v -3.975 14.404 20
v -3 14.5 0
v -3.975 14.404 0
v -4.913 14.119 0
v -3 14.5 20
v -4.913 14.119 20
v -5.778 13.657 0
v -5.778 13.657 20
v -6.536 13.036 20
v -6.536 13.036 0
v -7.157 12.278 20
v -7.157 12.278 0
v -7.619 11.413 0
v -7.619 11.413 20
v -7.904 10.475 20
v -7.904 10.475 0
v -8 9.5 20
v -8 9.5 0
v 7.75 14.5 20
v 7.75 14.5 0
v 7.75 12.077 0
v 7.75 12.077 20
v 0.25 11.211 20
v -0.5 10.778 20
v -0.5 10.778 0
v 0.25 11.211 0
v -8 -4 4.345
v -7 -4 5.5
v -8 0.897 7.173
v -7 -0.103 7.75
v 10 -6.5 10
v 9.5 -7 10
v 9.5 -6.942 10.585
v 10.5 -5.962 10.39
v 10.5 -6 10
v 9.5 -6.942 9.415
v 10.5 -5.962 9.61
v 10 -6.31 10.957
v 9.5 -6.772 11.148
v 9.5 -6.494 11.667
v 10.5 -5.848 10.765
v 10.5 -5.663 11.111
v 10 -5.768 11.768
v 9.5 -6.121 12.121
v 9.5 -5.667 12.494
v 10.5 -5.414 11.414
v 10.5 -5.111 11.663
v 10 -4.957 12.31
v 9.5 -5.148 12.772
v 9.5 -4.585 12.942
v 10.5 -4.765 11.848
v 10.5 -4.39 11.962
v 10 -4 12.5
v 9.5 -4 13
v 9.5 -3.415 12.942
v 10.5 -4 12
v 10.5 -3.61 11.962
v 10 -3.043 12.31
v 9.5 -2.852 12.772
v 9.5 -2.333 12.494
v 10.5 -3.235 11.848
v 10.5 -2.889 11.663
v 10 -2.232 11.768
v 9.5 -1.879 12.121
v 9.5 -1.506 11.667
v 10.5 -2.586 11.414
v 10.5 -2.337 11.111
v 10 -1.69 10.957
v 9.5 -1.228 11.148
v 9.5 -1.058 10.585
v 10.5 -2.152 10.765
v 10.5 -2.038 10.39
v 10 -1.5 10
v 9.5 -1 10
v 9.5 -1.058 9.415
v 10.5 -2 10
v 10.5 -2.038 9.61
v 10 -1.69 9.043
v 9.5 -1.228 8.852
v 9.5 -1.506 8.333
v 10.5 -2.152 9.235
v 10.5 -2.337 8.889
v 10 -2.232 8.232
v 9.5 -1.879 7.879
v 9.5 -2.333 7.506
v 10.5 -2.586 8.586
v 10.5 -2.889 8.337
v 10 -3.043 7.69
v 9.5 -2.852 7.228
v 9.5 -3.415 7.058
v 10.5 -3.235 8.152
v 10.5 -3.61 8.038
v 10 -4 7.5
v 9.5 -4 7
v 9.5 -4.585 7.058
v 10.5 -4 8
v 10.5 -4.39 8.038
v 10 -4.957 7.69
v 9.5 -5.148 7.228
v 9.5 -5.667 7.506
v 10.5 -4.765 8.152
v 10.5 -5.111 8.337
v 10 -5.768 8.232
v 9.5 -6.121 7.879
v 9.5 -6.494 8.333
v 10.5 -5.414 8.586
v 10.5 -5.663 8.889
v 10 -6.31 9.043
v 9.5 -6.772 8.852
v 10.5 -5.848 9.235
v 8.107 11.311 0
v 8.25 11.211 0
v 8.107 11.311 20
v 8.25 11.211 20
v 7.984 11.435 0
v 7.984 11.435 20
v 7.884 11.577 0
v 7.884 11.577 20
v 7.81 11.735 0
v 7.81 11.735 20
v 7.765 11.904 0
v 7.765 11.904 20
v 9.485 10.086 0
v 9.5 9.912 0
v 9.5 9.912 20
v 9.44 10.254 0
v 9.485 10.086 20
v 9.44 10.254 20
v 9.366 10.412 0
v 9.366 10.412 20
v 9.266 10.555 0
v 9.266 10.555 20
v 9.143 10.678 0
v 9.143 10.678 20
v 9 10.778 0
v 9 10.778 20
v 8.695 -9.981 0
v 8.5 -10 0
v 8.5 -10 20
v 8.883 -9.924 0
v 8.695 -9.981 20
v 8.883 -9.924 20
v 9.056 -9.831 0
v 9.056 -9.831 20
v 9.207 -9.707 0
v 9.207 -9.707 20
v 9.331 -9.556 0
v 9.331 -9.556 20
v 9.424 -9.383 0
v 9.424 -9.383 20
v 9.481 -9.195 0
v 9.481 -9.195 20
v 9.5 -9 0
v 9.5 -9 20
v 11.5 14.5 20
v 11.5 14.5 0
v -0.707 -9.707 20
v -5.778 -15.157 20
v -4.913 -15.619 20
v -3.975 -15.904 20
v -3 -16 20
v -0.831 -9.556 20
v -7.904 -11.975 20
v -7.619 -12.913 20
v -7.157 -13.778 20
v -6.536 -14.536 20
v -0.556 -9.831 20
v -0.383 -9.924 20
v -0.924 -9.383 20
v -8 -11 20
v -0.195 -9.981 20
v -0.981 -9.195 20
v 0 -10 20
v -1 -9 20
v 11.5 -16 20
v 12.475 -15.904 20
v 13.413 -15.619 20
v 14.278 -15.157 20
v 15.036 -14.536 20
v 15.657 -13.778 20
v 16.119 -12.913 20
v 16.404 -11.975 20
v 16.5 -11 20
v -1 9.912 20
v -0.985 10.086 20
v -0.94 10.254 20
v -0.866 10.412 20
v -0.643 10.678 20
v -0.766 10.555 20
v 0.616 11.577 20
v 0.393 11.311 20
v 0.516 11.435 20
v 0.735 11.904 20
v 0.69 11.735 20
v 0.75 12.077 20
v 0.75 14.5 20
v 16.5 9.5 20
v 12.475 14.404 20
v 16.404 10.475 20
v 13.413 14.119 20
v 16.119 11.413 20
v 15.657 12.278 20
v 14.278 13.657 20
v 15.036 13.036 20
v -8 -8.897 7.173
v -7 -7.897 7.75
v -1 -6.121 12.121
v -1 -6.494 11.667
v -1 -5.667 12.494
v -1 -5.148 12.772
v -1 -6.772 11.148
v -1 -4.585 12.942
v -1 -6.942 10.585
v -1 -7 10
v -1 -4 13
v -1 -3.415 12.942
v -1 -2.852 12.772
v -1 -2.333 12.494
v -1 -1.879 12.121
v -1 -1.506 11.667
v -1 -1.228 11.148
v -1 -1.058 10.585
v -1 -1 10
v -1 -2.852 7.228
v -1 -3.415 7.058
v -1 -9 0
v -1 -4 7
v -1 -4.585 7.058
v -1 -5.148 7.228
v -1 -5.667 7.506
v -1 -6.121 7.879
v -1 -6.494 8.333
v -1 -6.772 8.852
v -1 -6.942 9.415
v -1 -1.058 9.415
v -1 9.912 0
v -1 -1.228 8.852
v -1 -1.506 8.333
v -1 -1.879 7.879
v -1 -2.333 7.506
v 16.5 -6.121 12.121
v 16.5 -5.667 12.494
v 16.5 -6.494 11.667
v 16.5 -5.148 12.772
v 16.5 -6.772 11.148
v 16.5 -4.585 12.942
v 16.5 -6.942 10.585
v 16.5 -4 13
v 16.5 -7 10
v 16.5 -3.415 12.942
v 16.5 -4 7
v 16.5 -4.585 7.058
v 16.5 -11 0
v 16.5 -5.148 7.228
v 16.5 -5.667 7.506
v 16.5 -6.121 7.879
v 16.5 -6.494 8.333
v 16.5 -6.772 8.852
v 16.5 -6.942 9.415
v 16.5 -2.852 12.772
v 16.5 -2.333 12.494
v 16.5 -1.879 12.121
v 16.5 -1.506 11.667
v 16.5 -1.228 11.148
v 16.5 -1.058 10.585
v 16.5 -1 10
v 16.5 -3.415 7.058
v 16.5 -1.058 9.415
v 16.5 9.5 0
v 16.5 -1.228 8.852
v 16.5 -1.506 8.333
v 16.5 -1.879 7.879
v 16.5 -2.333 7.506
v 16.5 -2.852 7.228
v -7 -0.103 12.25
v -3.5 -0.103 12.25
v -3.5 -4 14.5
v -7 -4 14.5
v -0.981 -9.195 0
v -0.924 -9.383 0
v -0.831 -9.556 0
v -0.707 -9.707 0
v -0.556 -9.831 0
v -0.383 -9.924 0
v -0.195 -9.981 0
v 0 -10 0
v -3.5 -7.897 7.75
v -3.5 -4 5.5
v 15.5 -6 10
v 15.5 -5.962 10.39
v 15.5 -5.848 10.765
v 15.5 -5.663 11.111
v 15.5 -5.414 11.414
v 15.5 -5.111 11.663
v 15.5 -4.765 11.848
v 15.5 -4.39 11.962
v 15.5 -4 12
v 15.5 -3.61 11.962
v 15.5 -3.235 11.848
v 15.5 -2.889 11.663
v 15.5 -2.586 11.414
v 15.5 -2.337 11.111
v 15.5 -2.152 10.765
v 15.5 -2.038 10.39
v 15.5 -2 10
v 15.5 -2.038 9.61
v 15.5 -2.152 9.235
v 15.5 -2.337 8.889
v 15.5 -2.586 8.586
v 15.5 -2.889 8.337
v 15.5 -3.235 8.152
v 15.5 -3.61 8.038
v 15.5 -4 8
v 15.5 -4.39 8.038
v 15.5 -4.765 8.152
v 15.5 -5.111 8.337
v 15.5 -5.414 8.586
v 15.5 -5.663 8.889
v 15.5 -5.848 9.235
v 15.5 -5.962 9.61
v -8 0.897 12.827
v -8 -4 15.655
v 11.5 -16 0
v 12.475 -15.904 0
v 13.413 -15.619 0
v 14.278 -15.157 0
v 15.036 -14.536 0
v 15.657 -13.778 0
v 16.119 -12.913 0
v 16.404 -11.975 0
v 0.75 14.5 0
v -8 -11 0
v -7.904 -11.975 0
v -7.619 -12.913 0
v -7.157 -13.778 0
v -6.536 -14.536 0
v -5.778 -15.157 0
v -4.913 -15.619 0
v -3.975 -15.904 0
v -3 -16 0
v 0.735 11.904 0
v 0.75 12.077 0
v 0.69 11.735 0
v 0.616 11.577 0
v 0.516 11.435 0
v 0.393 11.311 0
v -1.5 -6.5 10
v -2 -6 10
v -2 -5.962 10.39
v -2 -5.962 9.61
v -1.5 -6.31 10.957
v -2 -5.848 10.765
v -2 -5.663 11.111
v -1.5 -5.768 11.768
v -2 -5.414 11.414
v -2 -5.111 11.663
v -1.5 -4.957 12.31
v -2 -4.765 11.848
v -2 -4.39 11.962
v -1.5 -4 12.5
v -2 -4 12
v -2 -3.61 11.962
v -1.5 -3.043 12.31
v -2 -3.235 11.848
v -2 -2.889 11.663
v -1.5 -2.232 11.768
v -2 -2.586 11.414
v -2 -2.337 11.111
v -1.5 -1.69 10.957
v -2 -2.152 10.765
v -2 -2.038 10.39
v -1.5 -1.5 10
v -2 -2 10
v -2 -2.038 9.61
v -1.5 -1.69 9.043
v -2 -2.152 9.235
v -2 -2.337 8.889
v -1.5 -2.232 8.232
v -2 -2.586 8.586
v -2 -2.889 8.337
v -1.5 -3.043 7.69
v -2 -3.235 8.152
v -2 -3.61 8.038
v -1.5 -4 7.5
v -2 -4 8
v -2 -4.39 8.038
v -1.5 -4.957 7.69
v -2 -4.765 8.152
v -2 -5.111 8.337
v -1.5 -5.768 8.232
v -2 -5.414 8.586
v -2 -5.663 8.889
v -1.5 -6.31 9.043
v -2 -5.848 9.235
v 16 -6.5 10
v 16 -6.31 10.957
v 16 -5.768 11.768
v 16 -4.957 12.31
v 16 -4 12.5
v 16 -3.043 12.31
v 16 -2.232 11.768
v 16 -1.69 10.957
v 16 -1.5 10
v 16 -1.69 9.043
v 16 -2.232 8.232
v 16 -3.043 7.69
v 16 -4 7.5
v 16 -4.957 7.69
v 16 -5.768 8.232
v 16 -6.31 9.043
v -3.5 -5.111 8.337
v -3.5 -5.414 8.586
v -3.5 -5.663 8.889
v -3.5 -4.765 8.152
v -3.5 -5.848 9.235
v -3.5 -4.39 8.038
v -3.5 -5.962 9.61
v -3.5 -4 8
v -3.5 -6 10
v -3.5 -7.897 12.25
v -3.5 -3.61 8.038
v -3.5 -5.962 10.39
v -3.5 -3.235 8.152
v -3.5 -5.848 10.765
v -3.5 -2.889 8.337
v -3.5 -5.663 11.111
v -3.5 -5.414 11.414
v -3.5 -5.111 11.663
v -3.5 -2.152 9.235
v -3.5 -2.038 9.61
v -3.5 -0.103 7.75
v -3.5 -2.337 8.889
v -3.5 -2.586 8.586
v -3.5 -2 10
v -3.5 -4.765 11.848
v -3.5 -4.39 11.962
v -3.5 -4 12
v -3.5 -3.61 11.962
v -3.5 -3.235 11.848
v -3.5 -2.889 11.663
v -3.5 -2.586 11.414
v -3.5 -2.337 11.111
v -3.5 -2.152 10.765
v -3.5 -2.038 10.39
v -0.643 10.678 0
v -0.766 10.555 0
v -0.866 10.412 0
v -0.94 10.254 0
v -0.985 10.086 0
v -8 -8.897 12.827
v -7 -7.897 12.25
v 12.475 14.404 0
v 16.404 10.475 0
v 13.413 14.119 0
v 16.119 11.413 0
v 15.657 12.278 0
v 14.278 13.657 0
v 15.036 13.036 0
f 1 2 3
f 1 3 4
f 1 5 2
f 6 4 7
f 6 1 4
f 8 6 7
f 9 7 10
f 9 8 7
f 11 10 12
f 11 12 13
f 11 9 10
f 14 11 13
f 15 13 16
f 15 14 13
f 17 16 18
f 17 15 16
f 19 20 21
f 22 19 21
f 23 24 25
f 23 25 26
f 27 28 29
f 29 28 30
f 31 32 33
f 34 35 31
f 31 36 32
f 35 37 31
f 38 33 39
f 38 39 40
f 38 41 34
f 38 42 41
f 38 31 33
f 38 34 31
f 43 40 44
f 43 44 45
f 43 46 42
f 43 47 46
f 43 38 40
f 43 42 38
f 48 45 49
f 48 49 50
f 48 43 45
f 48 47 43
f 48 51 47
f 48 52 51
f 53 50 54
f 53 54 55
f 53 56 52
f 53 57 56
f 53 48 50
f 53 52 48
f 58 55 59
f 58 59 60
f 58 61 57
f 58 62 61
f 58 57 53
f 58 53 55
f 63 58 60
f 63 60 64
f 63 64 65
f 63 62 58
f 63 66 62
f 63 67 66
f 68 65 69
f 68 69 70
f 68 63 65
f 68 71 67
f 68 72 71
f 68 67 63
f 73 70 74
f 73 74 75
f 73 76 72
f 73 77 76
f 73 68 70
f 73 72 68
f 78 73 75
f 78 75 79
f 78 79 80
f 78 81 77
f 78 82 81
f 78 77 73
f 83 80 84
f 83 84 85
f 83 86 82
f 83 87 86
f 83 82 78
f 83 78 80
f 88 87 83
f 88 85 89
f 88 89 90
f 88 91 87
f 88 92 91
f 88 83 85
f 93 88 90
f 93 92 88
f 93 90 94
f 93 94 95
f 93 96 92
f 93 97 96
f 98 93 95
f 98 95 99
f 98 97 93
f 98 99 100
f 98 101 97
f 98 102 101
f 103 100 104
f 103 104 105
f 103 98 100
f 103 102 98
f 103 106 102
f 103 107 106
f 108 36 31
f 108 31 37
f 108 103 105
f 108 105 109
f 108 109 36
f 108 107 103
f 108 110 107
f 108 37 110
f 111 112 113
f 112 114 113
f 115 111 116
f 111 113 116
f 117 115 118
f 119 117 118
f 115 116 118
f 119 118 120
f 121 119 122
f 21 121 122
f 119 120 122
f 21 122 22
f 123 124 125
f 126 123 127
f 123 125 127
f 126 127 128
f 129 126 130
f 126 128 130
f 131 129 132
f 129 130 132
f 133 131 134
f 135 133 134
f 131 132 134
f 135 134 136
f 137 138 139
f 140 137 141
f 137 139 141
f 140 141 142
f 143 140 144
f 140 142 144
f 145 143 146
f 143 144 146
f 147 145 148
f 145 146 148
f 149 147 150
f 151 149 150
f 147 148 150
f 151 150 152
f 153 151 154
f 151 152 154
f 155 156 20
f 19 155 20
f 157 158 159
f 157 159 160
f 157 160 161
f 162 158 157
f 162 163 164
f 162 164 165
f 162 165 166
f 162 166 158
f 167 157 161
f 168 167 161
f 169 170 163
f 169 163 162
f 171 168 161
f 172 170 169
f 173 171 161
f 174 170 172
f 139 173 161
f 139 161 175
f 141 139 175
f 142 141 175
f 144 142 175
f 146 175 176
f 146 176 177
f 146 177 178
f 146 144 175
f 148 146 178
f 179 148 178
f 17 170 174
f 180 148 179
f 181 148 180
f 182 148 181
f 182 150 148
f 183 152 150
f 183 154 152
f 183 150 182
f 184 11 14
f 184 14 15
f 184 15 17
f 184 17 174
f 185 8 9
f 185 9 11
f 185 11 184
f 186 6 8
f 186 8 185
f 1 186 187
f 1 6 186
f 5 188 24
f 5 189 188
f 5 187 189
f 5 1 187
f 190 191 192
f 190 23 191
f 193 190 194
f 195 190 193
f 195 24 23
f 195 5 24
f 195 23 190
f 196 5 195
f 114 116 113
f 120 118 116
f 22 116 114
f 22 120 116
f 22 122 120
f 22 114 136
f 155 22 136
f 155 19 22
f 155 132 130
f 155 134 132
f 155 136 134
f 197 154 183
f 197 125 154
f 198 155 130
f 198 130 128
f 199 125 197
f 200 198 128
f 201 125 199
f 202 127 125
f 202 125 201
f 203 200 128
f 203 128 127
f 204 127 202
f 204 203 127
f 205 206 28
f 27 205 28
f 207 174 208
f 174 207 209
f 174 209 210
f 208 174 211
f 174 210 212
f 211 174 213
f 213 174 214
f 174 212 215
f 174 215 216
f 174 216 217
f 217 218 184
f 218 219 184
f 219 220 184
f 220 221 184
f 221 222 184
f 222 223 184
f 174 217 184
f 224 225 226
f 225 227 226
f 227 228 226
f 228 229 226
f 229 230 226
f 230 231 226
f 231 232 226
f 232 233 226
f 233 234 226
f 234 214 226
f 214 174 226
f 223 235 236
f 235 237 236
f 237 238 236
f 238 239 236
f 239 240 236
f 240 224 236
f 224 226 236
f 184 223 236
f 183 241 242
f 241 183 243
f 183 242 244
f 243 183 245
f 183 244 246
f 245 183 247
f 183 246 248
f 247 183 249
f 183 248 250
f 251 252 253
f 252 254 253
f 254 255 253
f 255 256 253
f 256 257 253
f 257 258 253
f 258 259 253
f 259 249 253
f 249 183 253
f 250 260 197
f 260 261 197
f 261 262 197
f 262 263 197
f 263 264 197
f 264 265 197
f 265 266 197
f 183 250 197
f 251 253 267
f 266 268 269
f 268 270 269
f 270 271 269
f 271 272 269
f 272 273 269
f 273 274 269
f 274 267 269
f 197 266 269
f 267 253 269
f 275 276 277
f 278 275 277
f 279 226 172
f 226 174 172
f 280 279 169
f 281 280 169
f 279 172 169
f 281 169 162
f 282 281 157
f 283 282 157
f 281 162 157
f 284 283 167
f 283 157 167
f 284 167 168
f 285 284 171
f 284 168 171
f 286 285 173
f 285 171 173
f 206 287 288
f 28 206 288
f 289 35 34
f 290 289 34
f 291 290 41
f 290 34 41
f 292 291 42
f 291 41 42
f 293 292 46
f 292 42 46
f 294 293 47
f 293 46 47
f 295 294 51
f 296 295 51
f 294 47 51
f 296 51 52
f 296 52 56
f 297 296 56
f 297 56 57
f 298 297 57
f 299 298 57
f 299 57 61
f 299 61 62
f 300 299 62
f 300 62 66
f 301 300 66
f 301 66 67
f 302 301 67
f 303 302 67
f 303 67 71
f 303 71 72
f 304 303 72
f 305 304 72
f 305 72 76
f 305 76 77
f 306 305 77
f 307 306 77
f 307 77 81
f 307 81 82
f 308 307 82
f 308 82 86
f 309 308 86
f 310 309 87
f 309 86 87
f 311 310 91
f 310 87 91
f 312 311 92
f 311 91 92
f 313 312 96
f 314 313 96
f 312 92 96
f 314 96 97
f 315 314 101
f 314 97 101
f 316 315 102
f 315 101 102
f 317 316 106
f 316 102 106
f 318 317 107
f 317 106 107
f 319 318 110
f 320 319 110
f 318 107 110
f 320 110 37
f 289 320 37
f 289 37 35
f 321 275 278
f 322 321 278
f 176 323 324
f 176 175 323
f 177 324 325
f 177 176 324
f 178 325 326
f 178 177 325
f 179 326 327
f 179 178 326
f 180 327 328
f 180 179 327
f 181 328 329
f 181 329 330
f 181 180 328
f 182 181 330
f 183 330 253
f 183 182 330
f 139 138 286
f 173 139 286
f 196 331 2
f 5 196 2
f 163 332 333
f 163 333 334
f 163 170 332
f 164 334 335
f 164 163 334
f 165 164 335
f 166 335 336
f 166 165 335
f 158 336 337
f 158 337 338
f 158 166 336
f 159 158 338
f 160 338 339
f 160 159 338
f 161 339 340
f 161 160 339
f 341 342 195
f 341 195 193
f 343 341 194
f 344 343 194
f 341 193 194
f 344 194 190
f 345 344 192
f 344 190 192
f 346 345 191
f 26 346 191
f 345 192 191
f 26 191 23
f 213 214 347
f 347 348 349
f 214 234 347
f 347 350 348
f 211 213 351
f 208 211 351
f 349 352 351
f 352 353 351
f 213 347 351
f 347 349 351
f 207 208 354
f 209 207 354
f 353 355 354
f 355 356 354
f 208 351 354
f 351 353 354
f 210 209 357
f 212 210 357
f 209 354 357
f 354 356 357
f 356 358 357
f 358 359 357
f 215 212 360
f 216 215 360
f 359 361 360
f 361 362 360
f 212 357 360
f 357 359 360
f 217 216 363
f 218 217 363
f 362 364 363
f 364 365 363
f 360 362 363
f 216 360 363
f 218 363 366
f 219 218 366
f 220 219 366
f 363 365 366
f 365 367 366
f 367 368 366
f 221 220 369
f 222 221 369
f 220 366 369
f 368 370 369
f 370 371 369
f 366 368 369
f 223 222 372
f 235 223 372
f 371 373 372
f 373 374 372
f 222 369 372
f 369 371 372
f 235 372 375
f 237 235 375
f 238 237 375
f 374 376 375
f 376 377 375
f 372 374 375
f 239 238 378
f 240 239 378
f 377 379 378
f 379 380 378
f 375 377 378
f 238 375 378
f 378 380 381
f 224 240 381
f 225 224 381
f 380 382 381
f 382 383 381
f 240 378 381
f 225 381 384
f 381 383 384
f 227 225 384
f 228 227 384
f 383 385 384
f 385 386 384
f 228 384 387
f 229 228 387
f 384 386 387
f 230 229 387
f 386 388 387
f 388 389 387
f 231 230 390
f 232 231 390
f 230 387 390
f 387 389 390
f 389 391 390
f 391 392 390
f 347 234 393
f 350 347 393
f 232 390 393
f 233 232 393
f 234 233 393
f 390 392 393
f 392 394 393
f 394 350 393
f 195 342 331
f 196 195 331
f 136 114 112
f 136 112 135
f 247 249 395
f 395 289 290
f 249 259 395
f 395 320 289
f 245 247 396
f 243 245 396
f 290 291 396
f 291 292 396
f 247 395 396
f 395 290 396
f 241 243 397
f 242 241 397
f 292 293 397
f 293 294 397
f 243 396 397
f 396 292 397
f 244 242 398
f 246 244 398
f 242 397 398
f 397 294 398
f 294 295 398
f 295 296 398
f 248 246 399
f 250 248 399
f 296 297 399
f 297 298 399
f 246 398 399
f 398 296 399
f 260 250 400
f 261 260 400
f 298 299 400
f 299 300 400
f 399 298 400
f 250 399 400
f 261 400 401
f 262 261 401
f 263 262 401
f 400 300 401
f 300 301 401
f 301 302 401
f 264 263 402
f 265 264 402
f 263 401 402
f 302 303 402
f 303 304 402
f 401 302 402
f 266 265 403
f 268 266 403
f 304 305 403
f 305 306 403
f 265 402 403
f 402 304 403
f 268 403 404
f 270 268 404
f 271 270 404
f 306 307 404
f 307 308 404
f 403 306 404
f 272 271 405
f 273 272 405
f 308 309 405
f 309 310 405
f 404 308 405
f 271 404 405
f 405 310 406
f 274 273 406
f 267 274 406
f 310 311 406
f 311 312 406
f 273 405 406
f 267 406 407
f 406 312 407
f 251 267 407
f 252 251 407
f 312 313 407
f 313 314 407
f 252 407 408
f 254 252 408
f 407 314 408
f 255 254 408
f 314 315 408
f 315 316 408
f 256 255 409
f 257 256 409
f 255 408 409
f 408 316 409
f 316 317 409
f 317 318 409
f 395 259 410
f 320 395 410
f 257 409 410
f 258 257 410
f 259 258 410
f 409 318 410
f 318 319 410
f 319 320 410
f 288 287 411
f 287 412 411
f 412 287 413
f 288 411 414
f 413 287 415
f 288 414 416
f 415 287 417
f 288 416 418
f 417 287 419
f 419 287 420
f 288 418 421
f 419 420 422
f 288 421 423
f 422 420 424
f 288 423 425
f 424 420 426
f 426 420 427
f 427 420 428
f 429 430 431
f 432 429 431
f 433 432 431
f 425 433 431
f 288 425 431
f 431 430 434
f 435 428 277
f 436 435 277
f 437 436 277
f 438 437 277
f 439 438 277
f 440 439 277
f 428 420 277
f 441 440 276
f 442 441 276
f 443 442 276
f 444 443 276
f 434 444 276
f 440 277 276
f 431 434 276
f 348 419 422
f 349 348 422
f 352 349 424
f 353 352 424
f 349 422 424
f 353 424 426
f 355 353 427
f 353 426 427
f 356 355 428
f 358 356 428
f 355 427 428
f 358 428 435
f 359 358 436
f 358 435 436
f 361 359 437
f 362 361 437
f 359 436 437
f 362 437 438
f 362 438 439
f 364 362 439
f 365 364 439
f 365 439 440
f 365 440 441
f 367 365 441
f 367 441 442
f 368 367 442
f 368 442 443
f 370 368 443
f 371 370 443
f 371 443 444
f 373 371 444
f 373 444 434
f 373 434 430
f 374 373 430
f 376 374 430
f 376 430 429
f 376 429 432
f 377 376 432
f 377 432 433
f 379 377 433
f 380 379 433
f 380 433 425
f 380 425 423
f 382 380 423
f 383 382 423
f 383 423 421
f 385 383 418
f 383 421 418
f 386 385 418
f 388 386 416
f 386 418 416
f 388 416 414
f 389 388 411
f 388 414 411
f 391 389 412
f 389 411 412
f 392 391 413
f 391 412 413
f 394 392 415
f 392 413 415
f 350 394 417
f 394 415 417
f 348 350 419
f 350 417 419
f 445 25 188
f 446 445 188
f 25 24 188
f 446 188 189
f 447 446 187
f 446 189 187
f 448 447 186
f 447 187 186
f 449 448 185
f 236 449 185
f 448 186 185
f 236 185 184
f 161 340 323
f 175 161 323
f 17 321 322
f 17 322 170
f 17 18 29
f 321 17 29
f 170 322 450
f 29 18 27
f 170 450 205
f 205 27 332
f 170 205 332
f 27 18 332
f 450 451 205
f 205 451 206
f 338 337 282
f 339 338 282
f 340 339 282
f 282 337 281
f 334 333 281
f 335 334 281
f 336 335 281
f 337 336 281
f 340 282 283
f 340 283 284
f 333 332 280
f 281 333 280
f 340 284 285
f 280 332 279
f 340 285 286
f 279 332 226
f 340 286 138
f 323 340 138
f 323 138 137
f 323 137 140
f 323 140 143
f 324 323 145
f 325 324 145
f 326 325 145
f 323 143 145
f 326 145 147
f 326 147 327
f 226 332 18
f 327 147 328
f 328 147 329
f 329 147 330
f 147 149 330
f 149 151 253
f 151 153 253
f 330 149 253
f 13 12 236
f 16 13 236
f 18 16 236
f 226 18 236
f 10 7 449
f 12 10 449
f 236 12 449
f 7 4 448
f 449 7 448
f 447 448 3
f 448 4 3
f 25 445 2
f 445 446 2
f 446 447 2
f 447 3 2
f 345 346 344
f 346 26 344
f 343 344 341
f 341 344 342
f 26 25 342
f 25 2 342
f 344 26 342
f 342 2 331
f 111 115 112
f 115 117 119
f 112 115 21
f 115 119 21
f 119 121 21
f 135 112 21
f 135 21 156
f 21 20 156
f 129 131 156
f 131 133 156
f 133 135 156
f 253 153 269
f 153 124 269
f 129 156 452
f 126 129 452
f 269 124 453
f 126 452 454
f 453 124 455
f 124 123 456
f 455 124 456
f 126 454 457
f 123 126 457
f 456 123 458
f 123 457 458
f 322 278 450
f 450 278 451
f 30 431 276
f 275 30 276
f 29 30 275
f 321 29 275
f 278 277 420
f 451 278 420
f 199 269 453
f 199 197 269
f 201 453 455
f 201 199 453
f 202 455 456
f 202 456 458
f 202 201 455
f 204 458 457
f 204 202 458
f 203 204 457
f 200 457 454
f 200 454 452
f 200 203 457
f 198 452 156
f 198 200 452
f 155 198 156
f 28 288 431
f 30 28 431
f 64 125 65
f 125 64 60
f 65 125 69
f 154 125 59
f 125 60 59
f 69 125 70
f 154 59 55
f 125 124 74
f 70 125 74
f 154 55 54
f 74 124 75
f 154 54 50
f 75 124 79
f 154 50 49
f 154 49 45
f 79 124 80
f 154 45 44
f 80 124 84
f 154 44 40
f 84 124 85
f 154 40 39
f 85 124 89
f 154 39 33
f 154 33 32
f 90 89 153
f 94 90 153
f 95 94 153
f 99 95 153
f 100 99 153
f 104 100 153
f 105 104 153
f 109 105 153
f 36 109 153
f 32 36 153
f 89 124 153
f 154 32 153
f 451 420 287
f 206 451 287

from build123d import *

# Parameters (mm, degrees)
F2_DEPTH = 20
F3_R     = 5
F4_R     = 1
F6_START = -2.5
F6_DEPTH = 7.5
F7_R     = 2
F8_DEPTH = 25
F9_SIZE  = 1
F10_SIZE = 1


# Not quite as in the source:
# - a feature names something its author has since deleted; it is built from what else it names


with BuildPart() as f2:
    # F1 (on Top) → F2 (new body)
    with BuildSketch(Plane.XY):
        Polygon((0.75, 14.5), (-8, 14.5), (-8, -16), (16.5, -16), (16.5, 14.5), (7.75, 14.5), (7.75, 11.5), (9.5, 10.4896370289), (9.5, -10), (-1, -10), (-1, 10.4896370289), (0.75, 11.5), align=None)
    extrude(amount=F2_DEPTH)

    # F3
    f3_edges = [f2.edges().sort_by_distance(p)[0] for p in [
        (-8, 14.5, 10),
        (16.5, 14.5, 10),
        (-8, -16, 10),
        (16.5, -16, 10),
    ]]
    fillet(f3_edges, radius=F3_R)

    # F4
    f4_edges = [f2.edges().sort_by_distance(p)[0] for p in [
        (0.75, 11.5, 10),
        (7.75, 11.5, 10),
        (-1, 10.489637, 10),
        (9.5, 10.489637, 10),
        (9.5, -10, 10),
        (-1, -10, 10),
    ]]
    fillet(f4_edges, radius=F4_R)

    # F5 (on face) → F6 (cut)
    with BuildSketch(Plane.YZ.offset(-1).offset(F6_START)):
        Polygon((-7.897114317, 7.75), (-4, 5.5), (-0.102885683, 7.75), (-0.102885683, 12.25), (-4, 14.5), (-7.897114317, 12.25), align=None)
    extrude(amount=-F6_DEPTH, mode=Mode.SUBTRACT)

    # F7 (on face) → F8 (cut)
    with BuildSketch(Plane(origin=(-3.5, 0, 0), x_dir=(0, -1, 0), z_dir=(-1, 0, 0))):
        with Locations((4, 10)):
            Circle(F7_R)
    extrude(amount=-F8_DEPTH, mode=Mode.SUBTRACT)

    # F9
    f9_edges = [f2.edges().sort_by_distance(p)[0] for p in [
        (-8, -7.897114, 10),
        (-8, -5.948557, 13.375),
        (-8, -2.051443, 13.375),
        (-8, -0.102886, 10),
        (-8, -5.948557, 6.625),
        (-8, -2.051443, 6.625),
    ]]
    chamfer(f9_edges, length=F9_SIZE)

    # F10
    f10_edges = [f2.edges().sort_by_distance(p)[0] for p in [
        (16.5, -2, 10),
        (-1, -2, 10),
        (9.5, -2, 10),
    ]]
    chamfer(f10_edges, length=F10_SIZE)


solid = f2.part
